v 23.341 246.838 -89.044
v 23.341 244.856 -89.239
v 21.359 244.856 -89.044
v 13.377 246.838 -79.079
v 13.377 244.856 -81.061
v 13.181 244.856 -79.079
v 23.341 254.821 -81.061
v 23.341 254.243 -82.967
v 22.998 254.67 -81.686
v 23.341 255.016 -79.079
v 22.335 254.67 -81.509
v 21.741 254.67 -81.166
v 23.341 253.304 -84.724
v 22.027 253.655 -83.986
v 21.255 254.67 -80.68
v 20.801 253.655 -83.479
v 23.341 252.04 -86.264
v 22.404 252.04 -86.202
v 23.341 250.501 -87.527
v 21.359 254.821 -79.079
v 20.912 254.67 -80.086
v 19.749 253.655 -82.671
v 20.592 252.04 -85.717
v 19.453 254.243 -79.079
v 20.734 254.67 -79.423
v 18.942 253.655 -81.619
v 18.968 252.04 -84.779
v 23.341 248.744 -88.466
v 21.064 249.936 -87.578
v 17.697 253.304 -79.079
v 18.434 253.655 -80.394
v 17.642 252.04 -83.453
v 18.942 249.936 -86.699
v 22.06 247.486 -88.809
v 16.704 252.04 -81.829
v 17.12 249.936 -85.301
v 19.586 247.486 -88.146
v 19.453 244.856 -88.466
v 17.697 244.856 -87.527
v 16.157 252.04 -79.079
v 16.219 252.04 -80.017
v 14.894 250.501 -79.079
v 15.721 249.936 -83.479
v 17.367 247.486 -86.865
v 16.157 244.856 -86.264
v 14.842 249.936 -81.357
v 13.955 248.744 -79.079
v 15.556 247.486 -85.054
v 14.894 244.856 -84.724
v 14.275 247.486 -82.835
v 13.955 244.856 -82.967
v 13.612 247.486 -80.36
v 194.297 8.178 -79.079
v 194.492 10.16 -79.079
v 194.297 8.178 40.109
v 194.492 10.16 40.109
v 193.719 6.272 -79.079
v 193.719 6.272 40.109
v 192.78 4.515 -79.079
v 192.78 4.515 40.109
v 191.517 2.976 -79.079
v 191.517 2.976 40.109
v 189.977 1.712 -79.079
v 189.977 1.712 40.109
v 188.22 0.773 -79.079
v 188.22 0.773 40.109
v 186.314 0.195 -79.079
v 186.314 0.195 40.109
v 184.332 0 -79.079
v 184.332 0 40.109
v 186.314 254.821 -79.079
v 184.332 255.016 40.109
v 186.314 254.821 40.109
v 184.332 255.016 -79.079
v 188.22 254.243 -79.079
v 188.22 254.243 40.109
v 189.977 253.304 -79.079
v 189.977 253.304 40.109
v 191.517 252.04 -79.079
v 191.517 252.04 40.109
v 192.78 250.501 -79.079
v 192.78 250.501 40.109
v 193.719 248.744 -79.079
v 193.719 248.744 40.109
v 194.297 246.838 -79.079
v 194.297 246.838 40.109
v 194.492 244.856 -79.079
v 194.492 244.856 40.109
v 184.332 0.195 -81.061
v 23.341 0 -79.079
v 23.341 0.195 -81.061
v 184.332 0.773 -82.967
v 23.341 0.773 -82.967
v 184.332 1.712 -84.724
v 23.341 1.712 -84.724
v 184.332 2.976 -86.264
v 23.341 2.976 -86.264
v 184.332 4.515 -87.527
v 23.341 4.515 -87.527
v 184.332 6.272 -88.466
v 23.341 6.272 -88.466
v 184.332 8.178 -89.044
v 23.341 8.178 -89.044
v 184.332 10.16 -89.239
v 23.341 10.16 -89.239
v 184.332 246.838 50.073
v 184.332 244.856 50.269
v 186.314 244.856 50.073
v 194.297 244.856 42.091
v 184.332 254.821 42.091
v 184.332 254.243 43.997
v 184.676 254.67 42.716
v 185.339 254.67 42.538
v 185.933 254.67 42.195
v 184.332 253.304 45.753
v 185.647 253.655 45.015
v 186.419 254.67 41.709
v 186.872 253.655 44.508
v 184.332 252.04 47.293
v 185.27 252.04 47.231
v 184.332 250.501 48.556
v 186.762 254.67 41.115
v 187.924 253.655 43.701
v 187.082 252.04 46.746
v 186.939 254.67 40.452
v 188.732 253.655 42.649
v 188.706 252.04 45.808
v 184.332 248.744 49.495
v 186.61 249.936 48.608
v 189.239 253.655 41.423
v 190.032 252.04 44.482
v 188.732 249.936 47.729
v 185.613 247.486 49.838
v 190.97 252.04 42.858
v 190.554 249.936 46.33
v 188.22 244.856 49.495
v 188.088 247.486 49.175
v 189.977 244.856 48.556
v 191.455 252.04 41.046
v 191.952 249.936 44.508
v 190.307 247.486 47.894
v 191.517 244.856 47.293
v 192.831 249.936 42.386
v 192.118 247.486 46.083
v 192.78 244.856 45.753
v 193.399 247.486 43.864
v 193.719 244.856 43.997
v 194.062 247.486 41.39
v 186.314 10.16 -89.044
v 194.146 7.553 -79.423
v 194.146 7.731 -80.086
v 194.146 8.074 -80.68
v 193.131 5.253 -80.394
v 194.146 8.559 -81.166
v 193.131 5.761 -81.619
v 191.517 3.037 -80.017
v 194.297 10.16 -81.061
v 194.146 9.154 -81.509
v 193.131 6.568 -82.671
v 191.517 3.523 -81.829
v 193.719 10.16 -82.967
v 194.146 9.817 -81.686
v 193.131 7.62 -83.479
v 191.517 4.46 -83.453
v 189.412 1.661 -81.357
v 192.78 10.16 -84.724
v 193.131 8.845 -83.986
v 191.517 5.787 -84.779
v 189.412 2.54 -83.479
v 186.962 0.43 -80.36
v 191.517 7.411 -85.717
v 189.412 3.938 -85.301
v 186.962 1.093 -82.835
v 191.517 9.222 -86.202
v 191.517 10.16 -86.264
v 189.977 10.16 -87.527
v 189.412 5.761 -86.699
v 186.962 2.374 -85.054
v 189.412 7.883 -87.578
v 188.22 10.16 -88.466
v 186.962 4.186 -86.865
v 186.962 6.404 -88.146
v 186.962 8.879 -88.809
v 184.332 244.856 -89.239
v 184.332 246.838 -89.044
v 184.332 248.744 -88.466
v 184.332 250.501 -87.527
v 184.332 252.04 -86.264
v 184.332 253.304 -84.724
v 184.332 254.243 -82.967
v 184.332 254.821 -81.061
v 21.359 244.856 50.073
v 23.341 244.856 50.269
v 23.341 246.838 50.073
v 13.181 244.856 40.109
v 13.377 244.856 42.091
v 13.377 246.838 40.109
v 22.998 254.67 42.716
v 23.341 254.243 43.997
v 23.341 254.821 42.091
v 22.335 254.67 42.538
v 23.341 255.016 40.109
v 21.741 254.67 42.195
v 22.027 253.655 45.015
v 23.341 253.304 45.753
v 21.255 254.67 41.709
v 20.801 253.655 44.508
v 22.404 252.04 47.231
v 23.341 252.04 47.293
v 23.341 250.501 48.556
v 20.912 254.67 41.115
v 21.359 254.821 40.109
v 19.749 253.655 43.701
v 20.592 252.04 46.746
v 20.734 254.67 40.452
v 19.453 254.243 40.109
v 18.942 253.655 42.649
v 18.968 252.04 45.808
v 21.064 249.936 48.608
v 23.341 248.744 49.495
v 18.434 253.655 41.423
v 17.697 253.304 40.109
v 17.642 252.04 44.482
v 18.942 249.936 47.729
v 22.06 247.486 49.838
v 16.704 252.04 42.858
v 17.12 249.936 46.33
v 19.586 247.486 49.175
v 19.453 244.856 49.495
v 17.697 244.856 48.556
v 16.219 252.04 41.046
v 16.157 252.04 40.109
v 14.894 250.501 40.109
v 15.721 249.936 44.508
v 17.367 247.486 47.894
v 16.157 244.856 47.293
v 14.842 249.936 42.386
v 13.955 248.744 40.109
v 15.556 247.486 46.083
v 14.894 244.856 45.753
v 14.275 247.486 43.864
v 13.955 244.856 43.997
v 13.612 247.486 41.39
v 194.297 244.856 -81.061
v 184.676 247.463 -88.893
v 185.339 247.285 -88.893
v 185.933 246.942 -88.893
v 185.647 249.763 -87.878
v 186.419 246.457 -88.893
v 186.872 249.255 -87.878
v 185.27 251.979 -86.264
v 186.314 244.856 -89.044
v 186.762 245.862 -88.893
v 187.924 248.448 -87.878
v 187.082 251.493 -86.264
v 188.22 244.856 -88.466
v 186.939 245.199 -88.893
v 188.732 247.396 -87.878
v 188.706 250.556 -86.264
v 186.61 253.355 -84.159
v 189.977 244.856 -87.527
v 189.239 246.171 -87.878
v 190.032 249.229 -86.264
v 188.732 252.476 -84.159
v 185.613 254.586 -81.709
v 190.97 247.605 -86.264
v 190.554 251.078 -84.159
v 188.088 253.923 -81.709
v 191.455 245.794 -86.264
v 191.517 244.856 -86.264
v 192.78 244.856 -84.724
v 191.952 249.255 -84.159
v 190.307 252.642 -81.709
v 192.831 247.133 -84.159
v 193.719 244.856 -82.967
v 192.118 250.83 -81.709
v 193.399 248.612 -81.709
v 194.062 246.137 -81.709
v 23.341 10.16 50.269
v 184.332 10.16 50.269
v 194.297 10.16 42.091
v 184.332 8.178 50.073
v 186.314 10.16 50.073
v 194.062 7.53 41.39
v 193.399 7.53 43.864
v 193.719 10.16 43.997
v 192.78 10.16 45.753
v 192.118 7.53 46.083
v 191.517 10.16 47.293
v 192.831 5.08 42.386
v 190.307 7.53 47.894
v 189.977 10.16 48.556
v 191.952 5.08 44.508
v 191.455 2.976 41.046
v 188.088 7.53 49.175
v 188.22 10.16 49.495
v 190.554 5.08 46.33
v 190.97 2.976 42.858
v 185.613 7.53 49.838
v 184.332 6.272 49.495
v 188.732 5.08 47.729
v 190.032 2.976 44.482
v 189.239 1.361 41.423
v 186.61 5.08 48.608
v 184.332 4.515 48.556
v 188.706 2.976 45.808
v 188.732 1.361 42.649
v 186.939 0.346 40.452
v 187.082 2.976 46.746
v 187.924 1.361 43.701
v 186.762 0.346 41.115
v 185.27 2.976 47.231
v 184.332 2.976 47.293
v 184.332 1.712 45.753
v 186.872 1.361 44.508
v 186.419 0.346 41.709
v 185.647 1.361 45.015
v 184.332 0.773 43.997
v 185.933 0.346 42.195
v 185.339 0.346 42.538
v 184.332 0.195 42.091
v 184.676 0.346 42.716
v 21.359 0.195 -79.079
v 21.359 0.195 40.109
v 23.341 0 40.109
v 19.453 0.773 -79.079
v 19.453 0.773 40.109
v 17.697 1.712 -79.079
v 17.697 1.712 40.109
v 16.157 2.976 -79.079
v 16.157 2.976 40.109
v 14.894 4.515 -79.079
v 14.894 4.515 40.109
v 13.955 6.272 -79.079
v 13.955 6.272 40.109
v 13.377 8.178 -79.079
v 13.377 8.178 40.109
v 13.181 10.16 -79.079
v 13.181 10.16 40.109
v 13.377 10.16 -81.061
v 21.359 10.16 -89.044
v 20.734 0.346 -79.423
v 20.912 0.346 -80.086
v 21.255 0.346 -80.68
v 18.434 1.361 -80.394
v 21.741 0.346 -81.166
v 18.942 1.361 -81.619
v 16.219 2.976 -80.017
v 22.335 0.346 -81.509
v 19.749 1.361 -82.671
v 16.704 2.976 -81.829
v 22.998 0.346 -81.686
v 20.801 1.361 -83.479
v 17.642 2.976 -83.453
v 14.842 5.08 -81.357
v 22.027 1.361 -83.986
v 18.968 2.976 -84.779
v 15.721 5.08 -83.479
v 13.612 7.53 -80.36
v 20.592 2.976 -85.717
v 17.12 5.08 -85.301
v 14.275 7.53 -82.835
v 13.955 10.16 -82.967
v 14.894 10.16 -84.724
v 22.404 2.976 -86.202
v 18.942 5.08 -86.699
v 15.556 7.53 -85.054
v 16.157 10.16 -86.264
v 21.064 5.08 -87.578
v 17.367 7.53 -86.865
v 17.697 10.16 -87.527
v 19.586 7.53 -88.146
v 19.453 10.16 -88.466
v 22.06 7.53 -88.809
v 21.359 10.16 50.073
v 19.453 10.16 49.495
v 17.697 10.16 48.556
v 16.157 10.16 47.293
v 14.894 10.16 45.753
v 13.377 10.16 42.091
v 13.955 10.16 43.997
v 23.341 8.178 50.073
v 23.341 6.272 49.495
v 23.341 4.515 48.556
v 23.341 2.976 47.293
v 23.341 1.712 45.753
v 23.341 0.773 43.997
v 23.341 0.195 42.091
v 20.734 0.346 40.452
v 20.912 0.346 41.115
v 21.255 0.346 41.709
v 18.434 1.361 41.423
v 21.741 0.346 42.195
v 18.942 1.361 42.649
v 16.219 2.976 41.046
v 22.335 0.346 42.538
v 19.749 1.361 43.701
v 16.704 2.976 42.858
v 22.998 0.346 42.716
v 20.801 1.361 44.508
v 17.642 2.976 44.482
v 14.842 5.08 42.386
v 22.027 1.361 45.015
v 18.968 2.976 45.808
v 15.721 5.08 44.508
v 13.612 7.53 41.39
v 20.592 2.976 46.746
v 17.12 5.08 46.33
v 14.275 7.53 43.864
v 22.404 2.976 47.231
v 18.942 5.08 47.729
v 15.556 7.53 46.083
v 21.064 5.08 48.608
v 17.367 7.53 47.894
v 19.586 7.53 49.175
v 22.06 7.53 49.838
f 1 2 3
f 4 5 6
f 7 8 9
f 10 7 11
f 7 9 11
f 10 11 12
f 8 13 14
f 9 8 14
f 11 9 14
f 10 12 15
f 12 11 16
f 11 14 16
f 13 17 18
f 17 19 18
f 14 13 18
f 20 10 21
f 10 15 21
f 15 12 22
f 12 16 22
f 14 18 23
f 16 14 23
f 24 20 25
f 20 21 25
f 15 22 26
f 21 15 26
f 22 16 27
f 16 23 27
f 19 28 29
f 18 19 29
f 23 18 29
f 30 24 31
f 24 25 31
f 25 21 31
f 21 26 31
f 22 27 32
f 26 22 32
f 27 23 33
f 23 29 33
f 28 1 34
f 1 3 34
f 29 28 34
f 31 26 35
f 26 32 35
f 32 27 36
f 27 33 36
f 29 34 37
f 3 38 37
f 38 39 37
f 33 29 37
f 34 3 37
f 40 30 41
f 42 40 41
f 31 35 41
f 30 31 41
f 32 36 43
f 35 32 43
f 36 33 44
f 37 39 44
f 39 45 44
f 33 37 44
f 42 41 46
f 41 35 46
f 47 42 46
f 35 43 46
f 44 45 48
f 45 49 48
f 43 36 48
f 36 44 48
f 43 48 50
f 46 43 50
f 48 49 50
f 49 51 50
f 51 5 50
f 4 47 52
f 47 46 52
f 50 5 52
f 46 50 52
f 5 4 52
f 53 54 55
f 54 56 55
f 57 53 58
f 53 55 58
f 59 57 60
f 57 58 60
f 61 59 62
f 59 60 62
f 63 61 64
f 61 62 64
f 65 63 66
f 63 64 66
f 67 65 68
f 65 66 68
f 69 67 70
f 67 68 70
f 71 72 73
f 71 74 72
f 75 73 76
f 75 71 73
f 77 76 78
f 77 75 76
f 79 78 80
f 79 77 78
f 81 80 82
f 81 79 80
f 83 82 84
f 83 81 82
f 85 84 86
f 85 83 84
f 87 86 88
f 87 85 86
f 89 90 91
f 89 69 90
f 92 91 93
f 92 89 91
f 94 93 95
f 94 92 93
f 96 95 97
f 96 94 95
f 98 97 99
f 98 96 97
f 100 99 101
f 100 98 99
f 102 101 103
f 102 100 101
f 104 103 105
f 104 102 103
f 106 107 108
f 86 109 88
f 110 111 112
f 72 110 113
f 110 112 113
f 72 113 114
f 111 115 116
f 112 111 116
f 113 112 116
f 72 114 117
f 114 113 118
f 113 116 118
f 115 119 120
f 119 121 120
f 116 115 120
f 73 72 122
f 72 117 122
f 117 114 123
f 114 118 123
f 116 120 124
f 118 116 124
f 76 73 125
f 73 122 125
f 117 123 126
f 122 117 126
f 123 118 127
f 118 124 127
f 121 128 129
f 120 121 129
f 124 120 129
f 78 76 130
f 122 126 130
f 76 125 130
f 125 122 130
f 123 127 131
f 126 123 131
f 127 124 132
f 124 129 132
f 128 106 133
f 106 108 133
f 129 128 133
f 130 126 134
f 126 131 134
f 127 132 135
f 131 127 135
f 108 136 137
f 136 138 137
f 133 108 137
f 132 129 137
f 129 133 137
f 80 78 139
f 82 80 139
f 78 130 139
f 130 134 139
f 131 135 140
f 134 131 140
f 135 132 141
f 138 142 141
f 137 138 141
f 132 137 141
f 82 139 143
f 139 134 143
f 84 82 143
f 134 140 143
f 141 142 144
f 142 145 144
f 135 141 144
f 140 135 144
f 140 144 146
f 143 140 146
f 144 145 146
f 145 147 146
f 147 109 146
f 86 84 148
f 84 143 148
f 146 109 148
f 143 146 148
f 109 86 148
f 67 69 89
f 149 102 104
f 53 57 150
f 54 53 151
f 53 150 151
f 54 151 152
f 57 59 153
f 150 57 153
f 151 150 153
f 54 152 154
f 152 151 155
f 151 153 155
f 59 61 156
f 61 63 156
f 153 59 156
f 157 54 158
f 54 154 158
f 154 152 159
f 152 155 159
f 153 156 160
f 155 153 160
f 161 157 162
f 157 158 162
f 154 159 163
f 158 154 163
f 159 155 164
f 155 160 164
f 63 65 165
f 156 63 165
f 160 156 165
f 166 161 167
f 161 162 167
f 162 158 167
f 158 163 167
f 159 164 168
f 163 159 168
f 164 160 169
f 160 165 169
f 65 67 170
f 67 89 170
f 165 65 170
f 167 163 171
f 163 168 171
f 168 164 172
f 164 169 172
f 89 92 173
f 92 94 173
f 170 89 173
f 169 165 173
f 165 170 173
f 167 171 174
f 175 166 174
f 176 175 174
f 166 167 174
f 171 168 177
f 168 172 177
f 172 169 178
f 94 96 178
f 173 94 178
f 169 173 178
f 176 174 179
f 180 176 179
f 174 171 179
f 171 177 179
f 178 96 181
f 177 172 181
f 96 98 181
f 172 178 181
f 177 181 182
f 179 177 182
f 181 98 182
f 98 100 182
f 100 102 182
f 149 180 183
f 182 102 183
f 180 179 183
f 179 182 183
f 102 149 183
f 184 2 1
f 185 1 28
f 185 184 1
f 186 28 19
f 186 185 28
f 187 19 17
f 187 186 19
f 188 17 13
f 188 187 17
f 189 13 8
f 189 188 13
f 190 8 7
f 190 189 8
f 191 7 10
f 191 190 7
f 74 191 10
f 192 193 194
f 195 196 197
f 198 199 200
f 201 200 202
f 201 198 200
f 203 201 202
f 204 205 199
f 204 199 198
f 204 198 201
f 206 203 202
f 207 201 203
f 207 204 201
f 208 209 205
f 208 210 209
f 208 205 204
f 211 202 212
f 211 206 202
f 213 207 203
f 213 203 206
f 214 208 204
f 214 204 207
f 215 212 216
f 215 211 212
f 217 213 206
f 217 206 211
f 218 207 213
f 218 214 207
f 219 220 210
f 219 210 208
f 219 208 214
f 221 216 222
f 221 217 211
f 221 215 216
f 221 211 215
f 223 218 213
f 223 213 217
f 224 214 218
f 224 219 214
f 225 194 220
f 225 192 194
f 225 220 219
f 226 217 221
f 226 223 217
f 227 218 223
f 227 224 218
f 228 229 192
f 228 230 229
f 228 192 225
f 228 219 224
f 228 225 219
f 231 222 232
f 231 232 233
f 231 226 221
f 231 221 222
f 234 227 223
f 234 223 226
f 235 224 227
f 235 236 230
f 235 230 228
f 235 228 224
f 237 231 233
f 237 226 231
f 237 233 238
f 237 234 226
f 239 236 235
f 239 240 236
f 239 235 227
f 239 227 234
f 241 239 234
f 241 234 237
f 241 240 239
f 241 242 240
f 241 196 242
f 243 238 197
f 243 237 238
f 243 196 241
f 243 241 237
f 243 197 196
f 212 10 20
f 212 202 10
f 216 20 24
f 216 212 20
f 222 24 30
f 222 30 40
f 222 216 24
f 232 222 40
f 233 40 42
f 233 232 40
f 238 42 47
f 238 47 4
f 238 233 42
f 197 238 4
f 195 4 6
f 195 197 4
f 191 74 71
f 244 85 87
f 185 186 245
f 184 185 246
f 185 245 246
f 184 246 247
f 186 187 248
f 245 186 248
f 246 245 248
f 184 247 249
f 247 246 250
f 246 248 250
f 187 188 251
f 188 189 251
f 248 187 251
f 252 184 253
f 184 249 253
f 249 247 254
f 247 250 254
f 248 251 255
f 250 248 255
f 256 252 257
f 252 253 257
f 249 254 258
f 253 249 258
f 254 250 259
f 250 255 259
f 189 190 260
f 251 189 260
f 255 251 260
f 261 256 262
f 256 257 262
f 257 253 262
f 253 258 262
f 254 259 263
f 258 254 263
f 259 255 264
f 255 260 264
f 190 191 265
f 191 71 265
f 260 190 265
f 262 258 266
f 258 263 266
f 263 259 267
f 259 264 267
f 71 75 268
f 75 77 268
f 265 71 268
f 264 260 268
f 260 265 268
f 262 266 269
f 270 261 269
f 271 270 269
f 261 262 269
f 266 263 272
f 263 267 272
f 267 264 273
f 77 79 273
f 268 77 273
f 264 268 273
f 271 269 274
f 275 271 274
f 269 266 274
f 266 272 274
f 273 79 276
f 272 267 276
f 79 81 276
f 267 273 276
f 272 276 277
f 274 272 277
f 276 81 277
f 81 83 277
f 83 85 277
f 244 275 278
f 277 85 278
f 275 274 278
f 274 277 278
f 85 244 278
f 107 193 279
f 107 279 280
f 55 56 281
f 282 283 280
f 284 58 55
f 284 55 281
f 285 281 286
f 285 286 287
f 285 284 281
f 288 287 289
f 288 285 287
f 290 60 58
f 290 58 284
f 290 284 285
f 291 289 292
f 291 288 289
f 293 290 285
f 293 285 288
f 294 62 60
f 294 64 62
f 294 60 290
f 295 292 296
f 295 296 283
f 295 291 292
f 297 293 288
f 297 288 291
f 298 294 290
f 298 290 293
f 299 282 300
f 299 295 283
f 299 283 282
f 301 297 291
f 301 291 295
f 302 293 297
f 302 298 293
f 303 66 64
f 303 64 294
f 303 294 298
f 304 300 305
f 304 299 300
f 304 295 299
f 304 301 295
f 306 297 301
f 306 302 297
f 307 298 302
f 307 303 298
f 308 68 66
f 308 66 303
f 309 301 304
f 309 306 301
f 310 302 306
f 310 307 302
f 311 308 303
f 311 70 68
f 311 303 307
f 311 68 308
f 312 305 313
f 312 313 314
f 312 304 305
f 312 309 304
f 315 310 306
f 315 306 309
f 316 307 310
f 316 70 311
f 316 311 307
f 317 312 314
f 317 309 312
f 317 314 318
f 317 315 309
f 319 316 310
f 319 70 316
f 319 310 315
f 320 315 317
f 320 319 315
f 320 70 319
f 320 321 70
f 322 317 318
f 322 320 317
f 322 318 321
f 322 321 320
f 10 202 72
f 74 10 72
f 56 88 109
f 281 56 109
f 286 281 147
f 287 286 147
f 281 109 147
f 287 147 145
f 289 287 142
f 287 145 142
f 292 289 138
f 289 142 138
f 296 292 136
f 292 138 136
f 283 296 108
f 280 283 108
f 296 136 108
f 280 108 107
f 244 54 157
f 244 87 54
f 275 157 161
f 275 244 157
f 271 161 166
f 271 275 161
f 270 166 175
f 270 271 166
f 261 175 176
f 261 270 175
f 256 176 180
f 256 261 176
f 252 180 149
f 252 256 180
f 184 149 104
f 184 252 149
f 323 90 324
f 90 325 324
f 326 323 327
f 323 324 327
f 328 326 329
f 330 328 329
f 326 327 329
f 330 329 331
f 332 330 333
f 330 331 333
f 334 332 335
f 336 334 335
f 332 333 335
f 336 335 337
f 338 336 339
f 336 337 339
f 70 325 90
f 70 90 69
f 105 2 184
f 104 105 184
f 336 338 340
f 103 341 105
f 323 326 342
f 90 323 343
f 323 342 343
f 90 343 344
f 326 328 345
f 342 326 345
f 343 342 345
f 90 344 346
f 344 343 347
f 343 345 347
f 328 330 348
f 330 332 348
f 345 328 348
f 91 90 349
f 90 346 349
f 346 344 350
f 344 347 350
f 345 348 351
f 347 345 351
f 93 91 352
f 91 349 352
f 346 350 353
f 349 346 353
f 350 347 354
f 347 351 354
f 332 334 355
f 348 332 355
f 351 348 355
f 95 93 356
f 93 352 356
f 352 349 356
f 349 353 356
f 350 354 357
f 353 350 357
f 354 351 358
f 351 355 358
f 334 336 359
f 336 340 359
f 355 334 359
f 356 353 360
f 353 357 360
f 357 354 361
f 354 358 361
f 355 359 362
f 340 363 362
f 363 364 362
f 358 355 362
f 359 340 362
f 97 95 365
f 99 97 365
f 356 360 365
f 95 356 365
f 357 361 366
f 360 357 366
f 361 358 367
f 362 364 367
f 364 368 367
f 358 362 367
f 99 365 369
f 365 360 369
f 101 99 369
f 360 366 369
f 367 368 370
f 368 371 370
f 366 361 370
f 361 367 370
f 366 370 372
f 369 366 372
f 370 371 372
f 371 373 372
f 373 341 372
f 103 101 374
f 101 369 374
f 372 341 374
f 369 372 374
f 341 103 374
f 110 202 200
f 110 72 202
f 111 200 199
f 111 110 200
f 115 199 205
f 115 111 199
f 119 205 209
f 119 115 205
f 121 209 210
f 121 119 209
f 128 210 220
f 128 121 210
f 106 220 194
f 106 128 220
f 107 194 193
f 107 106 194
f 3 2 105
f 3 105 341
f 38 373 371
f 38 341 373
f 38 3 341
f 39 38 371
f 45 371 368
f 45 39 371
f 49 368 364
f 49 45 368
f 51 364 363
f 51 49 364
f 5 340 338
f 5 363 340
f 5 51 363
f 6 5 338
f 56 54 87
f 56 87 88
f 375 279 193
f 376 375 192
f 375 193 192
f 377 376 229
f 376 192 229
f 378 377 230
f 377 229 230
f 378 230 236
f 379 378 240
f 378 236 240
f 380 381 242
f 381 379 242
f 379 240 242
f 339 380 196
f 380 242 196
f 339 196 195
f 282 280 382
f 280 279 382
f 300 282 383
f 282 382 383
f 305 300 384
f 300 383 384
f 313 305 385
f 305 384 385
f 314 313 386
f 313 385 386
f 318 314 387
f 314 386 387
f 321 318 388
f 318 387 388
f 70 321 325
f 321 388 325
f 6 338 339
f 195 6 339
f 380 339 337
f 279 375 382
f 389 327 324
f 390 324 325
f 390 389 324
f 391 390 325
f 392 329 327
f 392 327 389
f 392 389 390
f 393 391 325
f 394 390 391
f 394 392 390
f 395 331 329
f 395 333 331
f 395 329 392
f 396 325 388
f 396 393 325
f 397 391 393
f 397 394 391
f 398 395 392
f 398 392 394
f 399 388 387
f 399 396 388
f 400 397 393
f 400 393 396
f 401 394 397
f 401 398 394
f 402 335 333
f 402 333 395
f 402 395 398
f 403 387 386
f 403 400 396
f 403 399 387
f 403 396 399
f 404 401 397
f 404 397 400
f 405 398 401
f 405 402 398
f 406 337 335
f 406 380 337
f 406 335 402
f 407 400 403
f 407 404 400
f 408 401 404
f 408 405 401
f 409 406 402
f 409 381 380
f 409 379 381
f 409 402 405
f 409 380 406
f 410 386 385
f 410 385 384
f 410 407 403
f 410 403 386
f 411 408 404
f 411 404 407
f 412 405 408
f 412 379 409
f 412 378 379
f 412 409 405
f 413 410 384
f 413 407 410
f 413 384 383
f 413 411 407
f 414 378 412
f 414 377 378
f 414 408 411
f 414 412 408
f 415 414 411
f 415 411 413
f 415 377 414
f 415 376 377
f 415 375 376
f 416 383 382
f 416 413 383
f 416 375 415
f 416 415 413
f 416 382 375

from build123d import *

# Parameters (mm, degrees)
F0_W     = 181.310957
F0_H     = 139.507879
F1_DEPTH = 255.016
F2_R     = 10.16
F3_R     = 10.16


with BuildPart() as f1:
    # F0 (on Front) → F1 (new body)
    with BuildSketch(Plane.XZ):
        with Locations((103.836832, -19.485397)):
            Rectangle(F0_W, F0_H)
    extrude(amount=-F1_DEPTH)

    # F2
    f2_edges = [f1.edges().sort_by_distance(p)[0] for p in [
        (194.49231, 127.508, 50.268542),
    ]]
    fillet(f2_edges, radius=F2_R)

    # F3
    f3_edges = [f1.edges().sort_by_distance(p)[0] for p in [
        (13.181353, 127.508, 50.268542),
        (13.181353, 127.508, -89.239337),
        (98.756832, 255.016, 50.268542),
        (103.836832, 255.016, -89.239337),
        (13.181353, 255.016, -19.485397),
        (194.49231, 255.016, -24.565397),
        (13.181353, 0, -19.485397),
        (103.836832, 0, -89.239337),
        (194.49231, 0, -24.565397),
        (98.756832, 0, 50.268542),
        (194.49231, 127.508, -89.239337),
    ]]
    fillet(f3_edges, radius=F3_R)


solid = f1.part
